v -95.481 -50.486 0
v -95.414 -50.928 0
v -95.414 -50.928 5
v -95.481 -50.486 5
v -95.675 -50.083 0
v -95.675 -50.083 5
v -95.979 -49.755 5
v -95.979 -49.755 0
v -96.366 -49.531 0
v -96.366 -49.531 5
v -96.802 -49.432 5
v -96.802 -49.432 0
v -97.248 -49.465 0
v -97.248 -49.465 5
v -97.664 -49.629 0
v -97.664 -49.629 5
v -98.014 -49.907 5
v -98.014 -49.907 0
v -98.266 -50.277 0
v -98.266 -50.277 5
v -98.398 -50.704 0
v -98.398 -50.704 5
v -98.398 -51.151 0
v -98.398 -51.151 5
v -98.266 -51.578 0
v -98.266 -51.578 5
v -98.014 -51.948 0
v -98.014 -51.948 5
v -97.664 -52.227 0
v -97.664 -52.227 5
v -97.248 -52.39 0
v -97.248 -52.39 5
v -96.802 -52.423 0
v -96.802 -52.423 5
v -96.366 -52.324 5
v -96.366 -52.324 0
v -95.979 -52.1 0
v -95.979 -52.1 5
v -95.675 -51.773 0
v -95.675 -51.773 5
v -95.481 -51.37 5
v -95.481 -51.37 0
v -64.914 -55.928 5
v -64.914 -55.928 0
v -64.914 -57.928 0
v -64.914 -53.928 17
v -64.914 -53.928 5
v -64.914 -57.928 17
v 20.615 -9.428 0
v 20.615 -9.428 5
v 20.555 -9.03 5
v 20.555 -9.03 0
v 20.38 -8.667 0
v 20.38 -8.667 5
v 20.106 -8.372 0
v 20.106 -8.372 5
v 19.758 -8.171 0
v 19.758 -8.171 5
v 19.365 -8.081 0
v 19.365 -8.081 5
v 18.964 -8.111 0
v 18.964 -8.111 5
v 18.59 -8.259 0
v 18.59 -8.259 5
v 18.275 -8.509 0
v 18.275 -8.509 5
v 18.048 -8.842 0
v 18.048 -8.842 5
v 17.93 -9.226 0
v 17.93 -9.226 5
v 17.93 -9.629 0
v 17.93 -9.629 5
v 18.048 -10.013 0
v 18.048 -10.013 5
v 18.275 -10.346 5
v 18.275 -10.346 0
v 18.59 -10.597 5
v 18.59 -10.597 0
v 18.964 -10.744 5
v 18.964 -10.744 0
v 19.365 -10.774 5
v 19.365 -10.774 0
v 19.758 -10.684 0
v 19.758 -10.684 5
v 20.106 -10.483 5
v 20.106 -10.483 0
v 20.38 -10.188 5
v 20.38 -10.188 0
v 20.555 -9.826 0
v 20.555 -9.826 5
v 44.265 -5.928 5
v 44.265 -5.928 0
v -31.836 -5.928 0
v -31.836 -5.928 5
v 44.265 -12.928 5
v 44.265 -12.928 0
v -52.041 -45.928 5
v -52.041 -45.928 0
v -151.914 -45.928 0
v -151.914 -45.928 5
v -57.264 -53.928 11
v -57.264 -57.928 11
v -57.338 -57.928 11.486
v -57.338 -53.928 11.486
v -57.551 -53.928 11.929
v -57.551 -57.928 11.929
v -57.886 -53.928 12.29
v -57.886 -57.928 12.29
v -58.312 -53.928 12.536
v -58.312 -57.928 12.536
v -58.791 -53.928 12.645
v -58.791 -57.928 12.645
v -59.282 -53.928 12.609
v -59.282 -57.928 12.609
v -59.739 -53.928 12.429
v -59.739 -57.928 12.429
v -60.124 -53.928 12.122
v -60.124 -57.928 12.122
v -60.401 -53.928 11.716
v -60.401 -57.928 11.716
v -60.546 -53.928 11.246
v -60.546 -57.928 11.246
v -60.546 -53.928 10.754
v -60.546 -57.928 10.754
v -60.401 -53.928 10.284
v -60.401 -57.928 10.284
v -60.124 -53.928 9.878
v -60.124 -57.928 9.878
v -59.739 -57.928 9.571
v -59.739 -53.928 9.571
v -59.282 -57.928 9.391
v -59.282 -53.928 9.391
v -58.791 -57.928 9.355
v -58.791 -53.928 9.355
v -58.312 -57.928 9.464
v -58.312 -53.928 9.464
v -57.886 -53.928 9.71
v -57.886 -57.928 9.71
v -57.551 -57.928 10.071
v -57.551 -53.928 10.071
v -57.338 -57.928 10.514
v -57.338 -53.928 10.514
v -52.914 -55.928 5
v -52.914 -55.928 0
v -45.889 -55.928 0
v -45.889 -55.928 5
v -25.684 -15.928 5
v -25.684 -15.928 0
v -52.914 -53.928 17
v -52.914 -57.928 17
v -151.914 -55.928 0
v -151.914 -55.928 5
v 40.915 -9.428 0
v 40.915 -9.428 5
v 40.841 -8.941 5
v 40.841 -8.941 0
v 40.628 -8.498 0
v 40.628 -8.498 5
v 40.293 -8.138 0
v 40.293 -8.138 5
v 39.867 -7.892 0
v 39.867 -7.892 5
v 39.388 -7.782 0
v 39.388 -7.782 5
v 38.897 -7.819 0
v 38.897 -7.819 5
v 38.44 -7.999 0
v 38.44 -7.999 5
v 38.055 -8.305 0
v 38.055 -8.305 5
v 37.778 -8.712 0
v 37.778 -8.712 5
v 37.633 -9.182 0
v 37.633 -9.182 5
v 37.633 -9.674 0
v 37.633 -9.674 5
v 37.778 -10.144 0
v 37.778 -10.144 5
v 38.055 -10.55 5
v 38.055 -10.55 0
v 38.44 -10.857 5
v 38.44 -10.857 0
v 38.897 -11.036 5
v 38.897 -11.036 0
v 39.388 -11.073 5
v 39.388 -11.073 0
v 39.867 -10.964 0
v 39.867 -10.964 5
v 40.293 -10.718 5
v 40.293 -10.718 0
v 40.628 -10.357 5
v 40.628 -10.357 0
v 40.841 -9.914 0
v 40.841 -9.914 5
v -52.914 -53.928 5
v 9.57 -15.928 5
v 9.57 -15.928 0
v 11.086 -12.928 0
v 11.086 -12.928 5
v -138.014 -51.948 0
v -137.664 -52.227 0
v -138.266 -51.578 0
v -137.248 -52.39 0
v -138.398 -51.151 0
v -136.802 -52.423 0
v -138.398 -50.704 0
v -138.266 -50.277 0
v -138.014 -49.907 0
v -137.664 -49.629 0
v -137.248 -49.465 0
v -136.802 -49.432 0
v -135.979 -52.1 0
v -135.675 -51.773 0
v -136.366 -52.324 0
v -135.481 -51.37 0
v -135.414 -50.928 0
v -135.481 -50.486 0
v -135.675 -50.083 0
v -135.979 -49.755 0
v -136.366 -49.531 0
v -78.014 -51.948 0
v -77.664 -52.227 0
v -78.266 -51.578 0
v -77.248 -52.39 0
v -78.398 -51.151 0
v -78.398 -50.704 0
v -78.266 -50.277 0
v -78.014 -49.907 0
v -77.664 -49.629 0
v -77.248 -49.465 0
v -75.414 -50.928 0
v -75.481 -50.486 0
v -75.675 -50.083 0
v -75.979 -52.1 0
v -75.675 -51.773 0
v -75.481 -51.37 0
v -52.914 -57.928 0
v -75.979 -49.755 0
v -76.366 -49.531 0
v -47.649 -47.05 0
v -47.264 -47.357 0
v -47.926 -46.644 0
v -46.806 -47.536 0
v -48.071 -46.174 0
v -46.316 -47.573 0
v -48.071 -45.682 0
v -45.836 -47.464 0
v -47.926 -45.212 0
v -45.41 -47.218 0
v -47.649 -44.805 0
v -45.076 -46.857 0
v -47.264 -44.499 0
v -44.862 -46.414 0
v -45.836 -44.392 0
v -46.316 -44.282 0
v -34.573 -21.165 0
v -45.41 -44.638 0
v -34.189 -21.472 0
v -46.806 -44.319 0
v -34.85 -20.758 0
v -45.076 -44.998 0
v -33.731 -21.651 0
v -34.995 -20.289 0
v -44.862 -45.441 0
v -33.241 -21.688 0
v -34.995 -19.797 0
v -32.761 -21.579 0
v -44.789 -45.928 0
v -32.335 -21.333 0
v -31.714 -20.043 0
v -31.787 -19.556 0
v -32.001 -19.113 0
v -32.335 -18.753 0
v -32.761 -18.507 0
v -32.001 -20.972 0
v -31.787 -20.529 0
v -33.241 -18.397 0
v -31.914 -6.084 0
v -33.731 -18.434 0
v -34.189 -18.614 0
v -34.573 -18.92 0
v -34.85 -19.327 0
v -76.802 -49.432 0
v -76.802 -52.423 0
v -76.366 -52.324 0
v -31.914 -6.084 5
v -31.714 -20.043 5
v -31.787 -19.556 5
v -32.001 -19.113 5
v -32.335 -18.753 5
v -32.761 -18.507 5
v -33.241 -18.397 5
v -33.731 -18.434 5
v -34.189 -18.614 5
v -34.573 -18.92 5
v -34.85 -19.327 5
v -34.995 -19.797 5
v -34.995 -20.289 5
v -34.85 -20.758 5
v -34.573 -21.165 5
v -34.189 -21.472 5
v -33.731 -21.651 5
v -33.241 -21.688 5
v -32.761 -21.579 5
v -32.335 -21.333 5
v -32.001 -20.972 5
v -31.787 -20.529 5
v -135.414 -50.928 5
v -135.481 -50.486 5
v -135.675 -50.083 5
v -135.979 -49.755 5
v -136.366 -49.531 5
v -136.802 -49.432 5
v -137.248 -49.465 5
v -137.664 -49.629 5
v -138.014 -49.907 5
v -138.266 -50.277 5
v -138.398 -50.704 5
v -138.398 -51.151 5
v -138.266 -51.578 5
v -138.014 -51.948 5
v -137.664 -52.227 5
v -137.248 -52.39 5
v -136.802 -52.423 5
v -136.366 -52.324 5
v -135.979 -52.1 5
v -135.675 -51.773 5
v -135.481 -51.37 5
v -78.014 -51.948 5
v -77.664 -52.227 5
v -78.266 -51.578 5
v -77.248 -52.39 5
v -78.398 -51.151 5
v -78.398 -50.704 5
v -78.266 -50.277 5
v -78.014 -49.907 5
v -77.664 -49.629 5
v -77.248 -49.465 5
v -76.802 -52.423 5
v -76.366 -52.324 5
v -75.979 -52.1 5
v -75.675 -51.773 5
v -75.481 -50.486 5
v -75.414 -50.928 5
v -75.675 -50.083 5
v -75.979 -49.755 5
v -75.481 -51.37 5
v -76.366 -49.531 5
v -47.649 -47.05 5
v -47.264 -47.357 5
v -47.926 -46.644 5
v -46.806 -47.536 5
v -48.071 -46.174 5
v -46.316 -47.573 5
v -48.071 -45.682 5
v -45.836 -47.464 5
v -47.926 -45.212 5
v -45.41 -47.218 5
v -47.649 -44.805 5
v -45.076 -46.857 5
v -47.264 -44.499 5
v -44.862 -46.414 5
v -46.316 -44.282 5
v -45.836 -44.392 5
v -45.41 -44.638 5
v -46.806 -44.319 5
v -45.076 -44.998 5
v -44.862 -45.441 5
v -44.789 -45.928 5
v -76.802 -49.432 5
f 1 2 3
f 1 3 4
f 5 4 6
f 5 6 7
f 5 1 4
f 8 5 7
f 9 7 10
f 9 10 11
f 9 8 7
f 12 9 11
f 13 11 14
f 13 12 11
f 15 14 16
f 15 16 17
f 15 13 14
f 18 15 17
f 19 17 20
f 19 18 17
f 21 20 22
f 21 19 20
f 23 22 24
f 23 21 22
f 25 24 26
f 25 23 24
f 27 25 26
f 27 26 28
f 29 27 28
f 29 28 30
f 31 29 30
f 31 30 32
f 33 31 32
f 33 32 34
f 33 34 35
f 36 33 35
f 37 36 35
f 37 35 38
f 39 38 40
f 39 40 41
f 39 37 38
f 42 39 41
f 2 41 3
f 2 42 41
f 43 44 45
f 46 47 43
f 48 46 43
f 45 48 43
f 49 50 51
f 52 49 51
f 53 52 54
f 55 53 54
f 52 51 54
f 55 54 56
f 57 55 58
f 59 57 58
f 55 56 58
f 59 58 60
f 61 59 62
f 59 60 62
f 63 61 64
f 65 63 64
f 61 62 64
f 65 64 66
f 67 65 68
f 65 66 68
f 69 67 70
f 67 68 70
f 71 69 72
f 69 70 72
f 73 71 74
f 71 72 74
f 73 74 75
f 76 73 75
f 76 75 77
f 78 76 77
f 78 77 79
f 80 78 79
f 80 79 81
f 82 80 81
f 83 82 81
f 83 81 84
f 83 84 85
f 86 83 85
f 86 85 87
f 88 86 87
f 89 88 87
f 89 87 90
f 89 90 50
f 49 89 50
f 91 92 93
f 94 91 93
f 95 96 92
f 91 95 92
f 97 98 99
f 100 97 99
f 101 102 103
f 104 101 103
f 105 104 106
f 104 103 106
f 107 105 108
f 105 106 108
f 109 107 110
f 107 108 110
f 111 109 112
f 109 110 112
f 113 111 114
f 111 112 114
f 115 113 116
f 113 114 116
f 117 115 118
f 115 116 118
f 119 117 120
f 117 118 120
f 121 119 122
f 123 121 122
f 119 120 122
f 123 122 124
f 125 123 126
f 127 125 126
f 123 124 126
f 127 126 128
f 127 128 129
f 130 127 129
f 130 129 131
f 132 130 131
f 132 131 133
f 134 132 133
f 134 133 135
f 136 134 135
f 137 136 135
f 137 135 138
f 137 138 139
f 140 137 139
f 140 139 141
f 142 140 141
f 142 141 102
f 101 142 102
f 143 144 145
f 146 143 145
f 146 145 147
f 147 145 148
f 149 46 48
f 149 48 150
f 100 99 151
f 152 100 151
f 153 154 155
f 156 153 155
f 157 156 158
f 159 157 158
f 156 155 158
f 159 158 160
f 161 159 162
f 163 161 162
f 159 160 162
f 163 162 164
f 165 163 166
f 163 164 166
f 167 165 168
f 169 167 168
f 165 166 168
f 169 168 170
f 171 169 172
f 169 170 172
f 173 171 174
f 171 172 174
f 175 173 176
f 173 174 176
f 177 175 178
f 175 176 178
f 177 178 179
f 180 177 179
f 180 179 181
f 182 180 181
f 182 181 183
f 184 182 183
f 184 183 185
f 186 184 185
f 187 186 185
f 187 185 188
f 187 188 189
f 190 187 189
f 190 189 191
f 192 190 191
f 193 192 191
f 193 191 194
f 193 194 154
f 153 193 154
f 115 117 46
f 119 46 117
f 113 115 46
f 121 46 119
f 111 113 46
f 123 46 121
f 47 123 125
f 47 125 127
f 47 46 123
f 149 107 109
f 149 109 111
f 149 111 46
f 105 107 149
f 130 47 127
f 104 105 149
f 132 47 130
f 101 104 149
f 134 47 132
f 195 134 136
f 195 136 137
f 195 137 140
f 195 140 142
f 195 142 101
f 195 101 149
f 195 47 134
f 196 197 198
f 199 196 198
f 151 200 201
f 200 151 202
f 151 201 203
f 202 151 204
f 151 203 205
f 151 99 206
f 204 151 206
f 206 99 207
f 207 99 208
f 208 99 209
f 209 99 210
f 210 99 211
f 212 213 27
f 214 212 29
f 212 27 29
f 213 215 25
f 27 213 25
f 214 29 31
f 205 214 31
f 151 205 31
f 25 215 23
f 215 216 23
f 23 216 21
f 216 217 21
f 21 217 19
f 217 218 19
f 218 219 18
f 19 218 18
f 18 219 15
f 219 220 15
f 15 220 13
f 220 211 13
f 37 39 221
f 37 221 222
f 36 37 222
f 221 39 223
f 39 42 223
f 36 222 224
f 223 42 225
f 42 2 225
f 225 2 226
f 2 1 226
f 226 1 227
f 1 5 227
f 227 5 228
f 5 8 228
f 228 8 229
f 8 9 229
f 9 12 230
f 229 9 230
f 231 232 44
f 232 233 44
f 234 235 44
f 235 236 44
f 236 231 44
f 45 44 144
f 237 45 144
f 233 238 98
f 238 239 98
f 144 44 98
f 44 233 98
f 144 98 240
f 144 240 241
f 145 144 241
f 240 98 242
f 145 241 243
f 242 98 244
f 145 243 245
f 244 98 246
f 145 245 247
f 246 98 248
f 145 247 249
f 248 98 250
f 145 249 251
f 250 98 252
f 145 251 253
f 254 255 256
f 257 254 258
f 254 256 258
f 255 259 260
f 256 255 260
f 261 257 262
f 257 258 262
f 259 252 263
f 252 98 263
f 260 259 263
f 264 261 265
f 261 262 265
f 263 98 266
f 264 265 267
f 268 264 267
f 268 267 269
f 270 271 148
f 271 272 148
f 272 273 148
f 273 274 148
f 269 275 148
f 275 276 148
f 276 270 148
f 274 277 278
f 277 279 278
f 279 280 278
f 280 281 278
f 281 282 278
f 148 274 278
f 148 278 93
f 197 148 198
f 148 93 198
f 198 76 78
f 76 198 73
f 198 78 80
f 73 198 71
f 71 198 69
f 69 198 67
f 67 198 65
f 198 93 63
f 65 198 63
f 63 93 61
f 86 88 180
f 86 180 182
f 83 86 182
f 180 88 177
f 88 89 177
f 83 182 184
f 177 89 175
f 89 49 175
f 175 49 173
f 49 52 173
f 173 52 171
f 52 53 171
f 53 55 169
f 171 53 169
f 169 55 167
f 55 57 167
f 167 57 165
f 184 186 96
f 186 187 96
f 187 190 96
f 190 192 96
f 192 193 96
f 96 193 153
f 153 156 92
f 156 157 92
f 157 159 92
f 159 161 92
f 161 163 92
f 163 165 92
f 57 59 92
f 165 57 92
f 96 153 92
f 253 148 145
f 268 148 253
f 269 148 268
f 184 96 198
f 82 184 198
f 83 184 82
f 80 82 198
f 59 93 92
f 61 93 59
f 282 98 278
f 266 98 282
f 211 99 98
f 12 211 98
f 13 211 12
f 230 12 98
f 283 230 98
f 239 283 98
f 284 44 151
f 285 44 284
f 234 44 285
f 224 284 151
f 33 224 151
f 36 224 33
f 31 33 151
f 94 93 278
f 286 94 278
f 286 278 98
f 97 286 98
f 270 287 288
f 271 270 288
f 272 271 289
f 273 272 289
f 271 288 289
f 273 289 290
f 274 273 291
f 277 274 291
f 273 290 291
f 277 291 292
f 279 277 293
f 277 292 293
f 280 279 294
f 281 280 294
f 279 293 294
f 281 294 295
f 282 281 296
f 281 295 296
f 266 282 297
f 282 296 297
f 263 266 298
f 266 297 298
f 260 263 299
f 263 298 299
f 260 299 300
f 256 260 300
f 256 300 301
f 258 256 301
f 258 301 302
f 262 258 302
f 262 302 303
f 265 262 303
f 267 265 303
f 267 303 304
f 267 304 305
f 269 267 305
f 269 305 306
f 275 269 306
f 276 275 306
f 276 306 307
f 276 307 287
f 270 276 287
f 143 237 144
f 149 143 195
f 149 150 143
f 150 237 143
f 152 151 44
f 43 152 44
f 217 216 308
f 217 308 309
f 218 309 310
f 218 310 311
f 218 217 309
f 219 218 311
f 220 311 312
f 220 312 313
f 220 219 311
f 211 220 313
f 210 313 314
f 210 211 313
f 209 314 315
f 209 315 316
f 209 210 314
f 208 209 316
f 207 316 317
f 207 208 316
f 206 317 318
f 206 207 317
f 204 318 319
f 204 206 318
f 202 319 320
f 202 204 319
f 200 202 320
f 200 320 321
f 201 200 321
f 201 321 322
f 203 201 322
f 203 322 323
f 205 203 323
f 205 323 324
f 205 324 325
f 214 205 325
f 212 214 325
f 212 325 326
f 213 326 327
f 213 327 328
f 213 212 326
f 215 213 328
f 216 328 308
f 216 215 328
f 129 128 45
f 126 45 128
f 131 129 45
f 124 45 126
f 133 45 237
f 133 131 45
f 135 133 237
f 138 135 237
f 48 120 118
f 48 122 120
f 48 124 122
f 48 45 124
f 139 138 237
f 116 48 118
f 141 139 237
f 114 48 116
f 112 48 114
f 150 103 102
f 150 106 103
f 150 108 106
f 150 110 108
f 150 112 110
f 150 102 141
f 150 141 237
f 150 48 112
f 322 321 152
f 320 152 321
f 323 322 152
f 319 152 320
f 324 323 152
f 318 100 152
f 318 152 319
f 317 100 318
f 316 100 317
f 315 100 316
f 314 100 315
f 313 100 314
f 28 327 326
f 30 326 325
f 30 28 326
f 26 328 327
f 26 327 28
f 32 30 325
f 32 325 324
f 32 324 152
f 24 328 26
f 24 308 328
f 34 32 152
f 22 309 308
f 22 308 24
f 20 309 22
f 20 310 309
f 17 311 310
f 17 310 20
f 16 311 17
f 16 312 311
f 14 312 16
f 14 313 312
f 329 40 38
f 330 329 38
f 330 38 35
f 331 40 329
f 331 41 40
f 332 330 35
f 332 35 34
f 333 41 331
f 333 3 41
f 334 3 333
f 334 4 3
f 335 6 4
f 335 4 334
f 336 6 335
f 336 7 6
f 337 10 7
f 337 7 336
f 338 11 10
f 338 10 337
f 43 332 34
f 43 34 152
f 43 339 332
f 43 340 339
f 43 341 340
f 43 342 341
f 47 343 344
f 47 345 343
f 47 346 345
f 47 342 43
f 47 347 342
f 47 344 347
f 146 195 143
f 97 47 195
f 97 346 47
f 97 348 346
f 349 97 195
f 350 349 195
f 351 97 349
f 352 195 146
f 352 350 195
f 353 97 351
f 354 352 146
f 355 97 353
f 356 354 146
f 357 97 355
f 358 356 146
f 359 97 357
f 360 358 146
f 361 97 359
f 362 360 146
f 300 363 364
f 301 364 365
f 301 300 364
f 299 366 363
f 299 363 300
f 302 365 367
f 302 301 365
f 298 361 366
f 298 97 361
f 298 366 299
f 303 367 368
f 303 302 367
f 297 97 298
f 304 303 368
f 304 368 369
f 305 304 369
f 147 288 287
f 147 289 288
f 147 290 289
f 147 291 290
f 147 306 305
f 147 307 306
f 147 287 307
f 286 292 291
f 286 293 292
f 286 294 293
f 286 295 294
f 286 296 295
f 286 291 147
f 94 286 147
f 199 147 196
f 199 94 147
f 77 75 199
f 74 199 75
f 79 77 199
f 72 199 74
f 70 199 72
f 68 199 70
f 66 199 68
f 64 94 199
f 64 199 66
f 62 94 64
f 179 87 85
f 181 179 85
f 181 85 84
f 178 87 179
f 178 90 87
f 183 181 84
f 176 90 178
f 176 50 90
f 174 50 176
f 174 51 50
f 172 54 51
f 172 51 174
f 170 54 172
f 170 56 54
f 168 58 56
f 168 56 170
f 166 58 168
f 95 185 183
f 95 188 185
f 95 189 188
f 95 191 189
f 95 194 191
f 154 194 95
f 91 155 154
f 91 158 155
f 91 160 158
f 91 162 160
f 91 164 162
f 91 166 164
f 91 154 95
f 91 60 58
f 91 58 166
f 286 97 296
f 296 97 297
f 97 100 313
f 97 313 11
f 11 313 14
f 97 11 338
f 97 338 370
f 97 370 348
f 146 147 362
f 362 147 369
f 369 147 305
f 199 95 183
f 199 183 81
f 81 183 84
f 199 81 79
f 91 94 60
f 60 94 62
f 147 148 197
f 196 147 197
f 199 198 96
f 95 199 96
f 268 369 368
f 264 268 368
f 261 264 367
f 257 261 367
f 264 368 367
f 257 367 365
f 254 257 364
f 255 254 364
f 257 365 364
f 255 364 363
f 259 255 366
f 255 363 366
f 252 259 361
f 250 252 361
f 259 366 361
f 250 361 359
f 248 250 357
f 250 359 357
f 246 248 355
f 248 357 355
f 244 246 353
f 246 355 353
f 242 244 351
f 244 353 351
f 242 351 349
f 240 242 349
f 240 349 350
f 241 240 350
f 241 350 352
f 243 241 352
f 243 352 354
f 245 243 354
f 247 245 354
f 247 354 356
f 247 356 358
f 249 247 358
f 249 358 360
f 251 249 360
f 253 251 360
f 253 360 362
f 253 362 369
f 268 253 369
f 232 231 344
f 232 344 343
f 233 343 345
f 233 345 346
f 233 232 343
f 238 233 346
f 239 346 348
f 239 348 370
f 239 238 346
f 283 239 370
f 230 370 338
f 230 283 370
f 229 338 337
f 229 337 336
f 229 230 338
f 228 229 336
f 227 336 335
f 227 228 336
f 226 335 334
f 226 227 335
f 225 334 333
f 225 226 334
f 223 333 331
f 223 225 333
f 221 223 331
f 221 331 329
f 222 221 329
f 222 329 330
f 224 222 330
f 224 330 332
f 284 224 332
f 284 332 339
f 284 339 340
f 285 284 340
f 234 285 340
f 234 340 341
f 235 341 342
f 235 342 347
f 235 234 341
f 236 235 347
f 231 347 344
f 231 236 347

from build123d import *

# Parameters (mm, degrees)
F0_R     = 1.5
F1_DEPTH = 5
F2_DEPTH = 268
F3_R     = 1.65
F3_R_2   = 1.35
F4_DEPTH = 5.001
F5_W     = 12
F5_H     = 2
F6_DEPTH = 12
F7_DEPTH = 5
F8_R     = 1.65
F9_DEPTH = 52.0010001044


# Not quite as in the source:
# - an extrude ends at something that could not be found from the text; its depth is read off the source's solid


with BuildPart() as f1:
    # F0 (on Top) → F1 (new body)
    with BuildSketch(Plane.XY):
        Polygon((-52.0408339798, -45.9276453106), (-151.9144345724, -45.9276453106), (-151.9144345724, -55.9276454151), (-45.8887560524, -55.9276454151), (-25.683571109, -15.9276453106), (9.5701563833, -15.9276453106), (11.0855654276, -12.9276453106), (44.264588505, -12.9276453106), (44.264588505, -5.9276453106), (27.9570557177, -5.9276453106), (-31.8356490892, -5.9276453106), (-31.9144345724, -6.0836161342), align=None)
        with Locations((-136.9144345724, -50.9276454151)):
            Circle(F0_R, mode=Mode.SUBTRACT)
        with Locations((-96.9144345724, -50.9276454151)):
            Circle(F0_R, mode=Mode.SUBTRACT)
        with Locations((-76.9144345724, -50.9276454151)):
            Circle(F0_R, mode=Mode.SUBTRACT)
    extrude(amount=F1_DEPTH)

    # F0 (on Top) → F2 (cut, through all)
    with BuildSketch(Plane.XY):
        with Locations((-76.9144345724, -50.9276454151)):
            Circle(F0_R)
        with Locations((-96.9144345724, -50.9276454151)):
            Circle(F0_R)
    extrude(amount=-F2_DEPTH, mode=Mode.SUBTRACT)

    # F3 (on face) → F4 (cut, through all)
    with BuildSketch(Plane.XY.offset(5)):
        with Locations((39.264588505, -9.4276453106)):
            Circle(F3_R)
        with Locations((19.264588505, -9.4276453106)):
            Circle(F3_R_2)
        with Locations((-33.3638369572, -20.042586615)):
            Circle(F3_R)
        with Locations((-46.4391469312, -45.9276454151)):
            Circle(F3_R)
    extrude(amount=-F4_DEPTH, mode=Mode.SUBTRACT)

    # F5 (on face) → F6 (join)
    with BuildSketch(Plane.XY.offset(5)):
        with Locations((-58.9144345724, -54.9276454151)):
            Rectangle(F5_W, F5_H)
        with Locations((-58.9144345724, -56.9276454151)):
            Rectangle(F5_W, F5_H)
    extrude(amount=F6_DEPTH)

    # F7 (add): a face of the model
    f7_faces = [f1.faces().sort_by_distance(p)[0] for p in [
        (-58.9144345724, -56.9276454151, 5),
    ]]
    extrude(f7_faces, amount=F7_DEPTH)

    # F8 (on face) → F9 (cut, through all)
    with BuildSketch(Plane.XZ.offset(57.9276454151)):
        with Locations((-58.9144345724, 11)):
            Circle(F8_R)
    extrude(amount=-F9_DEPTH, mode=Mode.SUBTRACT)


solid = f1.part
